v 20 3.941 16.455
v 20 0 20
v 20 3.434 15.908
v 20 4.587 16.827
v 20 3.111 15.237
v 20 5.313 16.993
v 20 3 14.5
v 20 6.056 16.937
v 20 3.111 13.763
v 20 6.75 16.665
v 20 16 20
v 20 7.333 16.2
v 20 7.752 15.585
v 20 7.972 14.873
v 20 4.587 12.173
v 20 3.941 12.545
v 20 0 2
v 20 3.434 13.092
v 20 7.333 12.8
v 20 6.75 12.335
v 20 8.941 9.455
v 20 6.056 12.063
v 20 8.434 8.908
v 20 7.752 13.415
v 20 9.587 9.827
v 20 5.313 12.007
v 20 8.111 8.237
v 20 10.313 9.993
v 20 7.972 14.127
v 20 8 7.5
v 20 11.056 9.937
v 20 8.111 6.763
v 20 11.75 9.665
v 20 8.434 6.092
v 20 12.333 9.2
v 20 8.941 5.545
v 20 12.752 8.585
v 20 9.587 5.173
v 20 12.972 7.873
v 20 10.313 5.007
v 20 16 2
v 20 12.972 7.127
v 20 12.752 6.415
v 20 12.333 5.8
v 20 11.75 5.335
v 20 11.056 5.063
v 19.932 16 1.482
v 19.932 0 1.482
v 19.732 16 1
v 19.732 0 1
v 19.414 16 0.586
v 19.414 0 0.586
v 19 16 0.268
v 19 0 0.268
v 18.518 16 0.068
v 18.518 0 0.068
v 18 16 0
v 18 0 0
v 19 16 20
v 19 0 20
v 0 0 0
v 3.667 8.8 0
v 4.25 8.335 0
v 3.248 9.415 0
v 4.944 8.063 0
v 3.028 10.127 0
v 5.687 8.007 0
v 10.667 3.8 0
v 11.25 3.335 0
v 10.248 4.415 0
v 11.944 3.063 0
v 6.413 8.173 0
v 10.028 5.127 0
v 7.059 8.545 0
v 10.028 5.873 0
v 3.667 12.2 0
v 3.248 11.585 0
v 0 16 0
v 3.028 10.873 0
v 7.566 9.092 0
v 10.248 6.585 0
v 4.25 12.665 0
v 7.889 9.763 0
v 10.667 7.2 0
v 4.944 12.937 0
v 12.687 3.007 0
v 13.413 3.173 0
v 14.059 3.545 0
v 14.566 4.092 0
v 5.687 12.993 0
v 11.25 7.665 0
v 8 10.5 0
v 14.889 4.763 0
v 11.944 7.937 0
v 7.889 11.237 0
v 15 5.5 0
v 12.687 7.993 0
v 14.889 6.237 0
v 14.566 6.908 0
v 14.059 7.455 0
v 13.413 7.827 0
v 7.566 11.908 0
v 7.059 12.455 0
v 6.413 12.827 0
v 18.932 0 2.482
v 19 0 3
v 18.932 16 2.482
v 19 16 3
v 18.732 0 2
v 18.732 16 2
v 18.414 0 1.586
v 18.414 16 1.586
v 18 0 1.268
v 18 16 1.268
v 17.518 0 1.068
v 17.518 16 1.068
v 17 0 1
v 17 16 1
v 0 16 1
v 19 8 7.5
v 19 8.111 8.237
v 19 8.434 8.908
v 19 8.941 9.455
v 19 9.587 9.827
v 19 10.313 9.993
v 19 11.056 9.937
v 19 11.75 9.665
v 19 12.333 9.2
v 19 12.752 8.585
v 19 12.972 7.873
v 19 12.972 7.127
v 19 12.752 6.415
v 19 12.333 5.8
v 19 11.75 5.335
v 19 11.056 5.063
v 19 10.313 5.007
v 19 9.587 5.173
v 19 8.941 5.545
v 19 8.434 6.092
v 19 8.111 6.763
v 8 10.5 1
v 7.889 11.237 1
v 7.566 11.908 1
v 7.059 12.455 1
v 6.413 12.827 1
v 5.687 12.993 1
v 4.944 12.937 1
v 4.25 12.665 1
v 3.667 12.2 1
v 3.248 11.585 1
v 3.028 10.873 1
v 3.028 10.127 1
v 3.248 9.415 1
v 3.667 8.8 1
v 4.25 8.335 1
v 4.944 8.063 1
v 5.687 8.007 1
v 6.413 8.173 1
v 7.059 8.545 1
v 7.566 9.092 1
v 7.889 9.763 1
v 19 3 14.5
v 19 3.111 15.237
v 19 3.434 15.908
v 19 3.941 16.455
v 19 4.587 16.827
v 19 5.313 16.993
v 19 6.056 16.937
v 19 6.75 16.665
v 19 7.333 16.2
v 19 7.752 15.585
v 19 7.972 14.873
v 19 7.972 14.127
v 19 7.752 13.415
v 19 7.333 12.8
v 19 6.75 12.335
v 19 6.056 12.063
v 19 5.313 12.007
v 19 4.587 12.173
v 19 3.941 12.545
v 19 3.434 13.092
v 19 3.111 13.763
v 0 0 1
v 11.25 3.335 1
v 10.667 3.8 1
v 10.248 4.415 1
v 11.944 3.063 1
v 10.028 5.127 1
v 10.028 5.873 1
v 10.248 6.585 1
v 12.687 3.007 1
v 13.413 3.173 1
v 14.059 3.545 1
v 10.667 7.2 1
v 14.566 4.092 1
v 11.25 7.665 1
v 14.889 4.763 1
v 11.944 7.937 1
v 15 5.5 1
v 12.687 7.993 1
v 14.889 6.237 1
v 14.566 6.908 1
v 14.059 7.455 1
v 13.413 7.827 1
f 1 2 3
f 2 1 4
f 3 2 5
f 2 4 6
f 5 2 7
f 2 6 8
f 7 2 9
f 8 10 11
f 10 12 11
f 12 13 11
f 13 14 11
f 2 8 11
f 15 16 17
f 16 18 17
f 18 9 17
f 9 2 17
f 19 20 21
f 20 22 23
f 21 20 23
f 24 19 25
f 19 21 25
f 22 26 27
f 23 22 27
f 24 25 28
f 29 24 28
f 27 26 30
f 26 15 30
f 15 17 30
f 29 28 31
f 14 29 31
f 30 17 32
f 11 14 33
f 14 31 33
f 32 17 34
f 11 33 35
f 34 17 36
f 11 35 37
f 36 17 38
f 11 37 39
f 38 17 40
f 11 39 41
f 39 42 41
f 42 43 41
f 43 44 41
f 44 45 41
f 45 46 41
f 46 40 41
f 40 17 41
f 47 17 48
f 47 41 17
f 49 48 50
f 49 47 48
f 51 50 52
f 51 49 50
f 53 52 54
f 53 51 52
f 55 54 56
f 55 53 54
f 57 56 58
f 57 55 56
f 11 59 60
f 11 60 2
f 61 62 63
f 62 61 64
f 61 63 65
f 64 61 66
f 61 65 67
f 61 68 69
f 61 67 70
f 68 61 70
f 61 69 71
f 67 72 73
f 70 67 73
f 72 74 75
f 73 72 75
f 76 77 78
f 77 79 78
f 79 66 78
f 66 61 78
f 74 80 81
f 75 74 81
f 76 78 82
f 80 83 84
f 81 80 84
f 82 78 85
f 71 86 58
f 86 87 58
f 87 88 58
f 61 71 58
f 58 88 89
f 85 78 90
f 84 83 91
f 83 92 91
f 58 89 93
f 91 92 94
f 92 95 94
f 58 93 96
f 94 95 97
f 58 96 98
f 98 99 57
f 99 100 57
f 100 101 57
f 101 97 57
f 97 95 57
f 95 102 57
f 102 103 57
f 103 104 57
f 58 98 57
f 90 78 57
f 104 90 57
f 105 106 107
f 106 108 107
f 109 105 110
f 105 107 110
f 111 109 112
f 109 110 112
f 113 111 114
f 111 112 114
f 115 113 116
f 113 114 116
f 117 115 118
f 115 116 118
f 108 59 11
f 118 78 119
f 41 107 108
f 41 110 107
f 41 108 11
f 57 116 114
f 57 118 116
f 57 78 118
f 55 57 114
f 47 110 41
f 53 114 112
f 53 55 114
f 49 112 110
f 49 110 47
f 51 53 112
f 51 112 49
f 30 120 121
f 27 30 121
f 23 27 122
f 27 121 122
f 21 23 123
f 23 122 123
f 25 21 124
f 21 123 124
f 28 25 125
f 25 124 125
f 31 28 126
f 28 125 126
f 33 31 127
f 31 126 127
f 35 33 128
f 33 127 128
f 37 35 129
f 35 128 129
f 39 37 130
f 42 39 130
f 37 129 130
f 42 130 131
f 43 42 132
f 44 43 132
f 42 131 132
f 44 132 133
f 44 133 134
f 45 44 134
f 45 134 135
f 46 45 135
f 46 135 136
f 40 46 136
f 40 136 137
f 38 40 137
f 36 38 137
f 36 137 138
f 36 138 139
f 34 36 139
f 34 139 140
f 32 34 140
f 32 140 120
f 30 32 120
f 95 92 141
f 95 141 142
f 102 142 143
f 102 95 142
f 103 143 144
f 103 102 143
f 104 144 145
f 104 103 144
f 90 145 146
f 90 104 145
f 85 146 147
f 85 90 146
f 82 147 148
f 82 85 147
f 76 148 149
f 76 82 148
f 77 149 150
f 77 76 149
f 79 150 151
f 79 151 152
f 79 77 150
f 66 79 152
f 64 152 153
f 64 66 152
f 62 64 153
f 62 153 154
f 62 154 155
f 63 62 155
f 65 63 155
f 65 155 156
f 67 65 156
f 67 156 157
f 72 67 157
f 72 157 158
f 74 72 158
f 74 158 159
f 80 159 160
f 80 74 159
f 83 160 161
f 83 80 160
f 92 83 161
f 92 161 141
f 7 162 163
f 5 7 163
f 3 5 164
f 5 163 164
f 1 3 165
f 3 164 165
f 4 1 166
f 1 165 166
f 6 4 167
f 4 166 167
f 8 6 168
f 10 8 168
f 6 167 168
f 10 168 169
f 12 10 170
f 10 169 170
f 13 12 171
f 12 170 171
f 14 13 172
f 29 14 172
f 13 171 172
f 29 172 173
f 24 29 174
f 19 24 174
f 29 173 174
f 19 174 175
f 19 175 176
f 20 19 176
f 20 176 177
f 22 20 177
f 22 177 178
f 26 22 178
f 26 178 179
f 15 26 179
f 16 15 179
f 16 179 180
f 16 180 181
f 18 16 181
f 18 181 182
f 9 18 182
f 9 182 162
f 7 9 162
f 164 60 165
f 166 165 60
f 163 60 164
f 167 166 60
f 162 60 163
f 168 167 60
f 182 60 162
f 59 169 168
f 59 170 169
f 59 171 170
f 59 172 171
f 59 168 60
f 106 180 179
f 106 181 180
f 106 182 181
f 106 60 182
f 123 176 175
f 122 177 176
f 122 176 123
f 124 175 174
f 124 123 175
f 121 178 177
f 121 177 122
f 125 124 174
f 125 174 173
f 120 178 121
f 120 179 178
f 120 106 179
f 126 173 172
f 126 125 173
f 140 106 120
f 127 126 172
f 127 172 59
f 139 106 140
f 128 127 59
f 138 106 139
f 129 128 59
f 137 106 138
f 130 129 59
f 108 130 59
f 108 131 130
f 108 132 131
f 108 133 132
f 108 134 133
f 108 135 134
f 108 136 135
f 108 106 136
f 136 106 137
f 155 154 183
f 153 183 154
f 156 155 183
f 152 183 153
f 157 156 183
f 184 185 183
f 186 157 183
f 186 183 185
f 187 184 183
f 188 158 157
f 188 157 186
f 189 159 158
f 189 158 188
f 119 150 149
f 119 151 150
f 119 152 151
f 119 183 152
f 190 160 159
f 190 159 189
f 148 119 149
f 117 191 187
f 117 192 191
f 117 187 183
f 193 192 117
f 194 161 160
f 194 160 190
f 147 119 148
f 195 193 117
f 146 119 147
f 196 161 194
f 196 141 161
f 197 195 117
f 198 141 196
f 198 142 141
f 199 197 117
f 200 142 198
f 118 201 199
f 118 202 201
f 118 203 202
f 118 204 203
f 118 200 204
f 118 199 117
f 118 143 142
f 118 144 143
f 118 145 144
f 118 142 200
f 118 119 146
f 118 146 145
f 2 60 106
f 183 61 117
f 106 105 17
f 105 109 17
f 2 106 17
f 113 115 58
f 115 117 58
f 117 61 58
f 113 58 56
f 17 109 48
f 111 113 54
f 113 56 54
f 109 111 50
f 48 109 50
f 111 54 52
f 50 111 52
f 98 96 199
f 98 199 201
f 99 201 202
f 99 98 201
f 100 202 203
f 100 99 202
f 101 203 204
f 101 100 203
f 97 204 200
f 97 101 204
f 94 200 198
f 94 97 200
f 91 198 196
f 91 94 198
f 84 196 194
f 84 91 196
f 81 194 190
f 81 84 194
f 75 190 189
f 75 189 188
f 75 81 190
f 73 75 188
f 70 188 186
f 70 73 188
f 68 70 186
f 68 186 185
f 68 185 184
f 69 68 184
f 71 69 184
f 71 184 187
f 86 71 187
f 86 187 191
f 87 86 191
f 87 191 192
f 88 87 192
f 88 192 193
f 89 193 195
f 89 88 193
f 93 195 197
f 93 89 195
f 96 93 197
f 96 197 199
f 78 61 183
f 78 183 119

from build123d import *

# Parameters (mm, degrees)
SKETCH_1_W          = 20
SKETCH_1_H          = 16
SKETCH_1_R          = 2.5
EXTRUDE_1_DEPTH     = 1
SKETCH_2_W          = 1
SKETCH_2_H          = 16
EXTRUDE_2_DEPTH     = 19
SKETCH_3_R          = 2.5
CUT_EXTRUDE_1_DEPTH = 32.890437438
FILLET_2_R          = 2


with BuildPart() as part:
    # 草图1 → 凸台-拉伸1 (new body)
    with BuildSketch(Plane.XY):
        with Locations((10, 8)):
            Rectangle(SKETCH_1_W, SKETCH_1_H)
        with Locations((5.5, 10.5)):
            Circle(SKETCH_1_R, mode=Mode.SUBTRACT)
        with Locations((12.5, 5.5)):
            Circle(SKETCH_1_R, mode=Mode.SUBTRACT)
    extrude(amount=EXTRUDE_1_DEPTH)

    # 草图2 → 凸台-拉伸2 (add)
    with BuildSketch(Plane.XY.offset(1)):
        with Locations((19.5, 8)):
            Rectangle(SKETCH_2_W, SKETCH_2_H)
    extrude(amount=EXTRUDE_2_DEPTH)

    # 草图3 → 切除-拉伸1 (cut, through all)
    with BuildSketch(Plane.ZY.offset(-19)):
        with Locations(Location((7.5, 10.5, 0), (0, 0, 270))):
            Circle(SKETCH_3_R)
        with Locations(Location((14.5, 5.5, 0), (0, 0, 270))):
            Circle(SKETCH_3_R)
    extrude(amount=-CUT_EXTRUDE_1_DEPTH, mode=Mode.SUBTRACT)

    # 圆角2
    fillet_2_edges = [part.edges().sort_by_distance(p)[0] for p in [
        (19, 8, 1),
        (20, 8, 0),
    ]]
    fillet(fillet_2_edges, radius=FILLET_2_R)


solid = part.part
